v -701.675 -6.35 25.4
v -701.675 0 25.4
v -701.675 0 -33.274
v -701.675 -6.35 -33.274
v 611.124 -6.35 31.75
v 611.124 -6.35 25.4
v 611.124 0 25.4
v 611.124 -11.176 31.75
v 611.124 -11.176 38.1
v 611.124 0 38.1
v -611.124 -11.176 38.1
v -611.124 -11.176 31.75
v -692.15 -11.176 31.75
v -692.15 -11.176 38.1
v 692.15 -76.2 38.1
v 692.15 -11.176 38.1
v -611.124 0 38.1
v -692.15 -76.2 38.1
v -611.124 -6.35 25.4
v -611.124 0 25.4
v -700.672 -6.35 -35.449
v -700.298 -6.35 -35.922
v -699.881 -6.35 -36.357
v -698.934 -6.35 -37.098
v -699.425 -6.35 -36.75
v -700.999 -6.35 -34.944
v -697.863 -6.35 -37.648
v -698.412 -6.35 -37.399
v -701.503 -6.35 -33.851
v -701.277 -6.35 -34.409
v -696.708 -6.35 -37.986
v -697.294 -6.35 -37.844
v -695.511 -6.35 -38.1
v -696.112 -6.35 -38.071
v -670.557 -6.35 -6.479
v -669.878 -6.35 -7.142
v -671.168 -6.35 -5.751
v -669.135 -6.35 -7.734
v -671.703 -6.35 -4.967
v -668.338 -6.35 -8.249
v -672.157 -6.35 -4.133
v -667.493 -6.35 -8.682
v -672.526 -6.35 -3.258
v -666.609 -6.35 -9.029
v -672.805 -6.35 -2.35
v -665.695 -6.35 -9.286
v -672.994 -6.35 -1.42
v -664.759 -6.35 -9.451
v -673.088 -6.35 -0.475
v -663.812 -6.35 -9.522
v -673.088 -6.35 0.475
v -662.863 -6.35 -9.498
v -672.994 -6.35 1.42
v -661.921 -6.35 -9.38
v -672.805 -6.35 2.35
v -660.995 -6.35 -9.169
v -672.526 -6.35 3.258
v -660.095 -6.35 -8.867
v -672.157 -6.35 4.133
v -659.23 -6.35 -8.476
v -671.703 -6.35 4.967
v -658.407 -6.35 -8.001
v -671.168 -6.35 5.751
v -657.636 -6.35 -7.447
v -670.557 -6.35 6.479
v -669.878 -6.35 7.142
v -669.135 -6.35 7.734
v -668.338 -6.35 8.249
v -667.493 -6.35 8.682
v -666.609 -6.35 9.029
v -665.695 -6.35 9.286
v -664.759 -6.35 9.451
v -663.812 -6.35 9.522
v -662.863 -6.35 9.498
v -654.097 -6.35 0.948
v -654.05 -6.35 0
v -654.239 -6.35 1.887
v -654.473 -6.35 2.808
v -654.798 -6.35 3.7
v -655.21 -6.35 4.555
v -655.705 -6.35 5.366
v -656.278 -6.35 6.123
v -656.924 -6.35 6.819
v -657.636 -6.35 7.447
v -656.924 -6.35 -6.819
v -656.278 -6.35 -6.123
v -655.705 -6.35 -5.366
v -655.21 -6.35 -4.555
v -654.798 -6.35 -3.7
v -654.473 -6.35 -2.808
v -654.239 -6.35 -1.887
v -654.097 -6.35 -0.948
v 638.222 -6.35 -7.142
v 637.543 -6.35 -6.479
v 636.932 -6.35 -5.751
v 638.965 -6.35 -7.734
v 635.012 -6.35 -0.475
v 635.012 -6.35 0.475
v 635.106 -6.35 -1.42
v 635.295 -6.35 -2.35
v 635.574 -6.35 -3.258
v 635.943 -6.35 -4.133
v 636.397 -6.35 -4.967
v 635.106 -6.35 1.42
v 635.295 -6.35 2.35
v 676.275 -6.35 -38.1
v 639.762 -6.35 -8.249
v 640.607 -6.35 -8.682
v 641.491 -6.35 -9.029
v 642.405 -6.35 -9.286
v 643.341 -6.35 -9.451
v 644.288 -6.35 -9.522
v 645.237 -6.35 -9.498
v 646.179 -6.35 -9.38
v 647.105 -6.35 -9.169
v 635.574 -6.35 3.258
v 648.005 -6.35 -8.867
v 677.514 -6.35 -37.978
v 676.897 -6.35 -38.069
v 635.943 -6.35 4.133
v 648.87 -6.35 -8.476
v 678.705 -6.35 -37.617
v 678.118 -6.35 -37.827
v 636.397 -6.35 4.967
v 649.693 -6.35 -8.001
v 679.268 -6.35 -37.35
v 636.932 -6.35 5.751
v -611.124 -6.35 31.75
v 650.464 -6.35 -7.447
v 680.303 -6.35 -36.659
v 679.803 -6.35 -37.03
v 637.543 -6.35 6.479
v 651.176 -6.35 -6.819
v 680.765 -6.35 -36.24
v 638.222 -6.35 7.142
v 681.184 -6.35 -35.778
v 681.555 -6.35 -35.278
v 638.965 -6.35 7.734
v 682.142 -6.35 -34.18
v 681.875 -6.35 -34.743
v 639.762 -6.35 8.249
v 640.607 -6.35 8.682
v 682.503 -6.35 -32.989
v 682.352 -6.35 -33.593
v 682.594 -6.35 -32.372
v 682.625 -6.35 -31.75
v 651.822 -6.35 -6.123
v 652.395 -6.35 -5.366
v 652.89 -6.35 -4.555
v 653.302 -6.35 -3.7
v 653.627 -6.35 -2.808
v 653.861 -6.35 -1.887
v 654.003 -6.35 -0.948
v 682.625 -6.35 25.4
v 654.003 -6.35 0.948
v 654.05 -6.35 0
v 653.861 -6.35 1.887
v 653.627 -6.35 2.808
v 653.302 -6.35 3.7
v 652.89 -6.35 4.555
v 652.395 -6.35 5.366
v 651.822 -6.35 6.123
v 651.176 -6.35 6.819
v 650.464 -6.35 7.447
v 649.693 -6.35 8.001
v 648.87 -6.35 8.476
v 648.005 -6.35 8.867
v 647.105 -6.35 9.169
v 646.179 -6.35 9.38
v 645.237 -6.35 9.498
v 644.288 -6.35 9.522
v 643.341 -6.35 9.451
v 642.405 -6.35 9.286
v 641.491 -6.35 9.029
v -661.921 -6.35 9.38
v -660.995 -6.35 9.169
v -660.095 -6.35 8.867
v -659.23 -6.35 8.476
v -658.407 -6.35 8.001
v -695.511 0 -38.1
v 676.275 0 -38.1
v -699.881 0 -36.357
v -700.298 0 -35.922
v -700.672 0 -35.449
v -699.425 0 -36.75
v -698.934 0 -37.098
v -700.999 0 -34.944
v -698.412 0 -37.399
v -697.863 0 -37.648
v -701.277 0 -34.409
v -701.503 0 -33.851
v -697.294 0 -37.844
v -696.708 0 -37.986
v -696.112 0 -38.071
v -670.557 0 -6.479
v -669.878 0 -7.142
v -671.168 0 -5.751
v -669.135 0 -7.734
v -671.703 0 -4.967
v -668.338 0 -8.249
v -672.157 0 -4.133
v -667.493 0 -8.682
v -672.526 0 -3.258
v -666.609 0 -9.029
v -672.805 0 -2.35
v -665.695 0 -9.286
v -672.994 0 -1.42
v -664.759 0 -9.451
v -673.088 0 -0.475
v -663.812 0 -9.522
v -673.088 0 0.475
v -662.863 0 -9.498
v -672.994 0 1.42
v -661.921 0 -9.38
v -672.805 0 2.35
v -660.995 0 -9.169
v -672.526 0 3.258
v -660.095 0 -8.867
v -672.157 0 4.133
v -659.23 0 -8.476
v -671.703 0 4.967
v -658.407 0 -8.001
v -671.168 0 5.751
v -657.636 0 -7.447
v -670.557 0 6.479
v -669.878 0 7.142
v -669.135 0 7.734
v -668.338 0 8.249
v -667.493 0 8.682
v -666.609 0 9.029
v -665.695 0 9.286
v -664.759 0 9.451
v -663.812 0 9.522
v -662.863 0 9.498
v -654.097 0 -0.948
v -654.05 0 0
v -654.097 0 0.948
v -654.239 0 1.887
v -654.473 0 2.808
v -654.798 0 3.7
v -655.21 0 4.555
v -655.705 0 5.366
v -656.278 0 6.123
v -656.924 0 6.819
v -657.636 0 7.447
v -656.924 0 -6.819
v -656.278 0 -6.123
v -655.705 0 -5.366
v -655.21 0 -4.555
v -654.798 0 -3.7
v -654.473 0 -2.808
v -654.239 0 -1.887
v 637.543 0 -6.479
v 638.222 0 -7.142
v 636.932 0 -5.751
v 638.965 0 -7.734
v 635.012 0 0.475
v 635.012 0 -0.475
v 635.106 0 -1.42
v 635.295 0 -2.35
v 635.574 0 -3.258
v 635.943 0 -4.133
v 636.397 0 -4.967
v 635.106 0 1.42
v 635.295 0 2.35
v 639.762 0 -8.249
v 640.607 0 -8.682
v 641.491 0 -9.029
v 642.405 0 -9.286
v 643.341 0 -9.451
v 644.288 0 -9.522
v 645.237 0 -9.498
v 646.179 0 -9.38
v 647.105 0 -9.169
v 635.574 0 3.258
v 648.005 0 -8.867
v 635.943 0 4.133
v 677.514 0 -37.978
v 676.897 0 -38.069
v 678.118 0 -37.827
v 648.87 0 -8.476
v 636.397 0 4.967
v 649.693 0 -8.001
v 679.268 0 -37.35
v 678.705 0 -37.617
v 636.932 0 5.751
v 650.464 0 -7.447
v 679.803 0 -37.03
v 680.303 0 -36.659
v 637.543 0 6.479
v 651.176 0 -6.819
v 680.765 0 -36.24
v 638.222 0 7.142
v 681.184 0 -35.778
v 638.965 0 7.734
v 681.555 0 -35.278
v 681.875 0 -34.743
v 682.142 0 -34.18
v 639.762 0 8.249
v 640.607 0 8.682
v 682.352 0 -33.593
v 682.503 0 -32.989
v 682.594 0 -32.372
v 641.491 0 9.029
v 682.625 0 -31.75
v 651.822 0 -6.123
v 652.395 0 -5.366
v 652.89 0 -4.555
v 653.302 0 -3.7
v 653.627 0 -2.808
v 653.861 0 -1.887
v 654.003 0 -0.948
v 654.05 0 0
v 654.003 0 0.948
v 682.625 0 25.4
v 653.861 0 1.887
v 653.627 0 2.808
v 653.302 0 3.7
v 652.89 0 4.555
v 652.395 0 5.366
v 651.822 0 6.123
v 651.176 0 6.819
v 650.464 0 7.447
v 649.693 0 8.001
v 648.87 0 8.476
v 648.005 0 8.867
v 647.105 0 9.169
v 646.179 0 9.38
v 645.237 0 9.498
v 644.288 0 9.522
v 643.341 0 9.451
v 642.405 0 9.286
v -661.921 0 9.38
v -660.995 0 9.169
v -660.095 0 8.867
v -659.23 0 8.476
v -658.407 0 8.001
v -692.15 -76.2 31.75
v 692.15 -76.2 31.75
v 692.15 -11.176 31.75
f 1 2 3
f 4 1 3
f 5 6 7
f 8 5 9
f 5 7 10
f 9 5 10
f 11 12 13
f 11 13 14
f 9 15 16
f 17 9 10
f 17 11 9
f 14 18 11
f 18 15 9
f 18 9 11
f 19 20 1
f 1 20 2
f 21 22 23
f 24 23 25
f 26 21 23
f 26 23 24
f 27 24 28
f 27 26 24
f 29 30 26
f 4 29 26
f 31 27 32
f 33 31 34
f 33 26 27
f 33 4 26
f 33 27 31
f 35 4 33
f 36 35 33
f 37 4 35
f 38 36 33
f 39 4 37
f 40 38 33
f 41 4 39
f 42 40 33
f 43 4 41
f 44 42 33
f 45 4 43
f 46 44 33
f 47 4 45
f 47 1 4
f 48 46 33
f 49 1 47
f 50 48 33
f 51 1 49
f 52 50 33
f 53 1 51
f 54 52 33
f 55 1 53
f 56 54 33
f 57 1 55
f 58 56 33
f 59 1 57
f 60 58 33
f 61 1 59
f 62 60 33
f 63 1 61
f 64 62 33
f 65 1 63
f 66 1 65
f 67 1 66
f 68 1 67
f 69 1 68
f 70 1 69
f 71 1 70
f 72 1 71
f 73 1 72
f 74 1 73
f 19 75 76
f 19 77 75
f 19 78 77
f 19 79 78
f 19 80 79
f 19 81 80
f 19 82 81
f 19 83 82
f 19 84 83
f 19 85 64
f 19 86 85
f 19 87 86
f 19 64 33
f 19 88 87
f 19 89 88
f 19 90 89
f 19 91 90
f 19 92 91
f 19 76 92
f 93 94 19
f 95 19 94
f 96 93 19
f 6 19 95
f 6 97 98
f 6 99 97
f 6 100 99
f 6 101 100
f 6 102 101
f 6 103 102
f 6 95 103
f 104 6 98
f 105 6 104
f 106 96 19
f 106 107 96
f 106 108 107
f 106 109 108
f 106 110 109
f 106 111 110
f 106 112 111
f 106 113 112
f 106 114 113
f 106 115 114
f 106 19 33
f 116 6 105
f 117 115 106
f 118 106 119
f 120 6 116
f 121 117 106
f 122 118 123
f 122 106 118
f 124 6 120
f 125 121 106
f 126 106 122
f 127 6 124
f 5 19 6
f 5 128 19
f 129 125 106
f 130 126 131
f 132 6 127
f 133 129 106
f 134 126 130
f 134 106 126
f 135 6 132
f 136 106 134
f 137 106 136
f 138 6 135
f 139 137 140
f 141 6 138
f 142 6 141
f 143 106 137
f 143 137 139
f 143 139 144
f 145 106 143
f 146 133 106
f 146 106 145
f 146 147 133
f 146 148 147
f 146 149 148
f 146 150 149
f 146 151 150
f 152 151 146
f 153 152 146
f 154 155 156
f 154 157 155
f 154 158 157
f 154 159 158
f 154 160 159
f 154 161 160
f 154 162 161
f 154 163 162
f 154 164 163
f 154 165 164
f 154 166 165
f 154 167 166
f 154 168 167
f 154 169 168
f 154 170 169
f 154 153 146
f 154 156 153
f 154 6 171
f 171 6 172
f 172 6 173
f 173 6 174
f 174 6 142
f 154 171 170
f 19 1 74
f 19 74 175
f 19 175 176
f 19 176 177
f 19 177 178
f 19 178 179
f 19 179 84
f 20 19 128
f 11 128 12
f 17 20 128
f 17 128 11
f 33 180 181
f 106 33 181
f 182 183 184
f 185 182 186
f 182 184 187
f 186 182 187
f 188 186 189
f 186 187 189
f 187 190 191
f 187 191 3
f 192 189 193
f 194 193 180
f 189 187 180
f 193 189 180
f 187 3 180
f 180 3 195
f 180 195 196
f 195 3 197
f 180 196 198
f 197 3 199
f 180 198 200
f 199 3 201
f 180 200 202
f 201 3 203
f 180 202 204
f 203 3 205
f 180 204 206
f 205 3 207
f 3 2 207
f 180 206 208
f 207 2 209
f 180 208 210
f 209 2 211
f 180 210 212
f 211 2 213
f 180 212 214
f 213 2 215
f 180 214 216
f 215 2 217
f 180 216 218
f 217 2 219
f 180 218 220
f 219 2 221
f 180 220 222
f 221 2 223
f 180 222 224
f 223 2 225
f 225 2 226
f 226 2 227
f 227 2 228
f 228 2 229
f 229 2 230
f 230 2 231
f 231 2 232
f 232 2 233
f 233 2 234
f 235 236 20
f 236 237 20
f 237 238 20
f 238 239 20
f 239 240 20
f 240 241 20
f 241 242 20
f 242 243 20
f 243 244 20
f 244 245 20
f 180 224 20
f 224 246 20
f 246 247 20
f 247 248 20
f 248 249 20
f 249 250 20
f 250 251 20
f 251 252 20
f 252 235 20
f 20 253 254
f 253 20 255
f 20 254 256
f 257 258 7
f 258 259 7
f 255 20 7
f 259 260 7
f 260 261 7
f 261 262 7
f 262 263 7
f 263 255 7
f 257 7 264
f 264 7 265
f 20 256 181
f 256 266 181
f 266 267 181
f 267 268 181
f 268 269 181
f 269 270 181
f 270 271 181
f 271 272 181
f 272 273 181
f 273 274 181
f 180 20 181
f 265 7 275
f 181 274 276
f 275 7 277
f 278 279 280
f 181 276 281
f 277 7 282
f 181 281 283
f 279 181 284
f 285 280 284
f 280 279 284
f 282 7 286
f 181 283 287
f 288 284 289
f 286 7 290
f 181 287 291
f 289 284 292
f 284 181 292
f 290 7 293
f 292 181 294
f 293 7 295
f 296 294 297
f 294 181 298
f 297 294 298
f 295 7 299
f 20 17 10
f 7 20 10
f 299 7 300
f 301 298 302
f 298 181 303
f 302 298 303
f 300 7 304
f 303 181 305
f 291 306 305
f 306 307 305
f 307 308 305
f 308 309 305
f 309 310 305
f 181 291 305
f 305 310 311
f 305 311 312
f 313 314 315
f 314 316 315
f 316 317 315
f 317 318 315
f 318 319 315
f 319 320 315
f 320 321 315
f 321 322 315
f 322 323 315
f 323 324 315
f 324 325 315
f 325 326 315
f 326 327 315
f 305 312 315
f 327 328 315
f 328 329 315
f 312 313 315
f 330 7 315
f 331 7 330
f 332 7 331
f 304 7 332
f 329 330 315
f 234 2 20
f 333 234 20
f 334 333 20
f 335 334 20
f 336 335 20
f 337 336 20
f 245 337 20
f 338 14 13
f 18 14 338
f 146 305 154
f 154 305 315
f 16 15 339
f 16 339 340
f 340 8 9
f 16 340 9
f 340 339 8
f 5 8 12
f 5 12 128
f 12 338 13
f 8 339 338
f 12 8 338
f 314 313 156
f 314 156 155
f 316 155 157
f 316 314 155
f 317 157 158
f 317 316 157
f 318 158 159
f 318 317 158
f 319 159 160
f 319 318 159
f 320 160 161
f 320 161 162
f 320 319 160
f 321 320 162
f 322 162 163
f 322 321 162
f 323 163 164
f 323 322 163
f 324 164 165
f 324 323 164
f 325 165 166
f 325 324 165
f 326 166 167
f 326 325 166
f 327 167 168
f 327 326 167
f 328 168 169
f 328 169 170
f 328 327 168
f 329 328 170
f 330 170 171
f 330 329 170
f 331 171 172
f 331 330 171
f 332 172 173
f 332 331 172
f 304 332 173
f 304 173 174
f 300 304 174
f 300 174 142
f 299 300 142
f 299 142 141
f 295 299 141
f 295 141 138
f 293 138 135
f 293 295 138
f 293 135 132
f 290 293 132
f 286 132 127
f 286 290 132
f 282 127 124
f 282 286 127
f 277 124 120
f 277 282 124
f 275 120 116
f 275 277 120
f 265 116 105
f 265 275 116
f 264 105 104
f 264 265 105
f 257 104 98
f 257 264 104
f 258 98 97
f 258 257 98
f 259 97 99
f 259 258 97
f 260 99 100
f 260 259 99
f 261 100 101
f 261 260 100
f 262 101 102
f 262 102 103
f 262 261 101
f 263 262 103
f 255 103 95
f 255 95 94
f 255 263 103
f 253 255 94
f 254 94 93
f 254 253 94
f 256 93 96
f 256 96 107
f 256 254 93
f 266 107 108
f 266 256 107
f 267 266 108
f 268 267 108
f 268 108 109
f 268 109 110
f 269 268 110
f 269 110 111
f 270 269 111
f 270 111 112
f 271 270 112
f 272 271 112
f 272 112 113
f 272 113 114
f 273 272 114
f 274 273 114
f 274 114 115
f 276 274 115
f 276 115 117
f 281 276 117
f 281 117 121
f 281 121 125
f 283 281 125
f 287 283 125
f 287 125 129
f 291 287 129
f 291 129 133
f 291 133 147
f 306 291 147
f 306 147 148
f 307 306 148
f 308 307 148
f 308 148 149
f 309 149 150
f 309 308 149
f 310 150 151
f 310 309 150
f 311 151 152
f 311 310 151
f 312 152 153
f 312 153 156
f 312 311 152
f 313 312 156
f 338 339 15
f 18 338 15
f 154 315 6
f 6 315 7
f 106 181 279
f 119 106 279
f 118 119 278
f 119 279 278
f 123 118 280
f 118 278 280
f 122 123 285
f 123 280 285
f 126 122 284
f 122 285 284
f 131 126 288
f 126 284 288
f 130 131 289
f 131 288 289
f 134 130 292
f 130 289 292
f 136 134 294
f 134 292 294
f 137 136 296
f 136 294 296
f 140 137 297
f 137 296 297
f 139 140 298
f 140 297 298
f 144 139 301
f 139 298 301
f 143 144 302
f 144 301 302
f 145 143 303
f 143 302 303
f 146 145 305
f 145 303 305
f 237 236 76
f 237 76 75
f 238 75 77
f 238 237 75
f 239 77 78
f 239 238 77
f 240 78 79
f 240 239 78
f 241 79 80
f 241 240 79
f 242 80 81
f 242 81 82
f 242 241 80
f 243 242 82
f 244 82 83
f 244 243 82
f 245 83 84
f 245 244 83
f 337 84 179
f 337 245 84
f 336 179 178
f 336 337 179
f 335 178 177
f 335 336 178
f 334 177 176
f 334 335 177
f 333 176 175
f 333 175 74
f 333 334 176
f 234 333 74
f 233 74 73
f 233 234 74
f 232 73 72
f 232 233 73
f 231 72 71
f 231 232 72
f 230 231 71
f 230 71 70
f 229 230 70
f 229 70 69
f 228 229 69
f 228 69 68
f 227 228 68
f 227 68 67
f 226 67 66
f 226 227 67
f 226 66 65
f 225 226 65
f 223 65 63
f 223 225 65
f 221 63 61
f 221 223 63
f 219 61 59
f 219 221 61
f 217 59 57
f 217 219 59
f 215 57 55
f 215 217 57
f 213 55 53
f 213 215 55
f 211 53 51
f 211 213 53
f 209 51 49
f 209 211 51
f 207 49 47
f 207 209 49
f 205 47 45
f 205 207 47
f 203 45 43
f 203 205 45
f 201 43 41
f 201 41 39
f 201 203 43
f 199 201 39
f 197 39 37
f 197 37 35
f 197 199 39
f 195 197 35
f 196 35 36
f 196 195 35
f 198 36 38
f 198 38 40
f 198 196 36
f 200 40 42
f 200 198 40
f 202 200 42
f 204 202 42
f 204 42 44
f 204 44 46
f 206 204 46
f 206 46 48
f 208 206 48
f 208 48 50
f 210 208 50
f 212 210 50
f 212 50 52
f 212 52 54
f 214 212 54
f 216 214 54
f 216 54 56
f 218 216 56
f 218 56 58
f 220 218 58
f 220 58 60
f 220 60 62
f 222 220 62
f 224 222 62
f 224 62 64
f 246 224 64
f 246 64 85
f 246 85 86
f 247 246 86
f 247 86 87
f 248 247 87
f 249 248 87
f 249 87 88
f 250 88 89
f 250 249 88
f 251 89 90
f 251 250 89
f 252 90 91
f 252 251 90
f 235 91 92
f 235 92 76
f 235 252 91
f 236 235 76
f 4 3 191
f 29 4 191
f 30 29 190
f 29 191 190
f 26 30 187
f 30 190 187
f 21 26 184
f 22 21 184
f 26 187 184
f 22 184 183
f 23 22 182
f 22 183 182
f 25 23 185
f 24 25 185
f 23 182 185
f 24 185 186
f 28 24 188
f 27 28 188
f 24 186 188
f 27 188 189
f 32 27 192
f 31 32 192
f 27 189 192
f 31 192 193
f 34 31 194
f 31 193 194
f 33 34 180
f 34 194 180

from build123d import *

# Parameters (mm, degrees)
F0_R     = 9.525
F0_W     = 1222.248
F0_H     = 6.35
F1_DEPTH = 6.35
F2_W     = 1222.248
F2_H     = 6.35
F3_DEPTH = 69.85
F4_W     = 65.024
F4_H     = 6.35
F5_DEPTH = 81.026
F6_W     = 65.024
F6_H     = 6.35
F7_DEPTH = 81.026


with BuildPart() as f1:
    # F0 (on Front) → F1 (new body)
    with BuildSketch(Plane.XZ):
        with BuildLine():
            ThreePointArc((-701.675, -33.274), (-699.424995, -36.749995), (-695.510592, -38.1))
            Line((-695.510592, -38.1), (676.275, -38.1))
            ThreePointArc((676.275, -38.1), (680.765128, -36.240128), (682.625, -31.75))
            Line((682.625, -31.75), (682.625, 25.4))
            Line((682.625, 25.4), (611.124, 25.4))
            Line((611.124, 25.4), (611.124, 31.75))
            Line((611.124, 31.75), (-611.124, 31.75))
            Line((-611.124, 31.75), (-611.124, 25.4))
            Line((-611.124, 25.4), (-701.675, 25.4))
            Line((-701.675, 25.4), (-701.675, -33.274))
        make_face()
        with Locations((-663.575, 0)):
            Circle(F0_R, mode=Mode.SUBTRACT)
        with Locations((644.525, 0)):
            Circle(F0_R, mode=Mode.SUBTRACT)
        with Locations((0, 34.925)):
            Rectangle(F0_W, F0_H)
    extrude(amount=F1_DEPTH)

    # F2 (on face) → F3 (join)
    with BuildSketch(Plane.XZ.offset(6.35)):
        with Locations((0, 34.925)):
            Rectangle(F2_W, F2_H)
    extrude(amount=F3_DEPTH)

    # F4 (on face) → F5 (join)
    with BuildSketch(Plane(origin=(-611.124, 0, 0), x_dir=(0, -1, 0), z_dir=(-1, 0, 0))):
        with Locations((43.688, 34.925)):
            Rectangle(F4_W, F4_H)
    extrude(amount=F5_DEPTH)

    # F6 (on face) → F7 (join)
    with BuildSketch(Plane.YZ.offset(611.124)):
        with Locations((-43.688, 34.925)):
            Rectangle(F6_W, F6_H)
    extrude(amount=F7_DEPTH)


solid = f1.part
